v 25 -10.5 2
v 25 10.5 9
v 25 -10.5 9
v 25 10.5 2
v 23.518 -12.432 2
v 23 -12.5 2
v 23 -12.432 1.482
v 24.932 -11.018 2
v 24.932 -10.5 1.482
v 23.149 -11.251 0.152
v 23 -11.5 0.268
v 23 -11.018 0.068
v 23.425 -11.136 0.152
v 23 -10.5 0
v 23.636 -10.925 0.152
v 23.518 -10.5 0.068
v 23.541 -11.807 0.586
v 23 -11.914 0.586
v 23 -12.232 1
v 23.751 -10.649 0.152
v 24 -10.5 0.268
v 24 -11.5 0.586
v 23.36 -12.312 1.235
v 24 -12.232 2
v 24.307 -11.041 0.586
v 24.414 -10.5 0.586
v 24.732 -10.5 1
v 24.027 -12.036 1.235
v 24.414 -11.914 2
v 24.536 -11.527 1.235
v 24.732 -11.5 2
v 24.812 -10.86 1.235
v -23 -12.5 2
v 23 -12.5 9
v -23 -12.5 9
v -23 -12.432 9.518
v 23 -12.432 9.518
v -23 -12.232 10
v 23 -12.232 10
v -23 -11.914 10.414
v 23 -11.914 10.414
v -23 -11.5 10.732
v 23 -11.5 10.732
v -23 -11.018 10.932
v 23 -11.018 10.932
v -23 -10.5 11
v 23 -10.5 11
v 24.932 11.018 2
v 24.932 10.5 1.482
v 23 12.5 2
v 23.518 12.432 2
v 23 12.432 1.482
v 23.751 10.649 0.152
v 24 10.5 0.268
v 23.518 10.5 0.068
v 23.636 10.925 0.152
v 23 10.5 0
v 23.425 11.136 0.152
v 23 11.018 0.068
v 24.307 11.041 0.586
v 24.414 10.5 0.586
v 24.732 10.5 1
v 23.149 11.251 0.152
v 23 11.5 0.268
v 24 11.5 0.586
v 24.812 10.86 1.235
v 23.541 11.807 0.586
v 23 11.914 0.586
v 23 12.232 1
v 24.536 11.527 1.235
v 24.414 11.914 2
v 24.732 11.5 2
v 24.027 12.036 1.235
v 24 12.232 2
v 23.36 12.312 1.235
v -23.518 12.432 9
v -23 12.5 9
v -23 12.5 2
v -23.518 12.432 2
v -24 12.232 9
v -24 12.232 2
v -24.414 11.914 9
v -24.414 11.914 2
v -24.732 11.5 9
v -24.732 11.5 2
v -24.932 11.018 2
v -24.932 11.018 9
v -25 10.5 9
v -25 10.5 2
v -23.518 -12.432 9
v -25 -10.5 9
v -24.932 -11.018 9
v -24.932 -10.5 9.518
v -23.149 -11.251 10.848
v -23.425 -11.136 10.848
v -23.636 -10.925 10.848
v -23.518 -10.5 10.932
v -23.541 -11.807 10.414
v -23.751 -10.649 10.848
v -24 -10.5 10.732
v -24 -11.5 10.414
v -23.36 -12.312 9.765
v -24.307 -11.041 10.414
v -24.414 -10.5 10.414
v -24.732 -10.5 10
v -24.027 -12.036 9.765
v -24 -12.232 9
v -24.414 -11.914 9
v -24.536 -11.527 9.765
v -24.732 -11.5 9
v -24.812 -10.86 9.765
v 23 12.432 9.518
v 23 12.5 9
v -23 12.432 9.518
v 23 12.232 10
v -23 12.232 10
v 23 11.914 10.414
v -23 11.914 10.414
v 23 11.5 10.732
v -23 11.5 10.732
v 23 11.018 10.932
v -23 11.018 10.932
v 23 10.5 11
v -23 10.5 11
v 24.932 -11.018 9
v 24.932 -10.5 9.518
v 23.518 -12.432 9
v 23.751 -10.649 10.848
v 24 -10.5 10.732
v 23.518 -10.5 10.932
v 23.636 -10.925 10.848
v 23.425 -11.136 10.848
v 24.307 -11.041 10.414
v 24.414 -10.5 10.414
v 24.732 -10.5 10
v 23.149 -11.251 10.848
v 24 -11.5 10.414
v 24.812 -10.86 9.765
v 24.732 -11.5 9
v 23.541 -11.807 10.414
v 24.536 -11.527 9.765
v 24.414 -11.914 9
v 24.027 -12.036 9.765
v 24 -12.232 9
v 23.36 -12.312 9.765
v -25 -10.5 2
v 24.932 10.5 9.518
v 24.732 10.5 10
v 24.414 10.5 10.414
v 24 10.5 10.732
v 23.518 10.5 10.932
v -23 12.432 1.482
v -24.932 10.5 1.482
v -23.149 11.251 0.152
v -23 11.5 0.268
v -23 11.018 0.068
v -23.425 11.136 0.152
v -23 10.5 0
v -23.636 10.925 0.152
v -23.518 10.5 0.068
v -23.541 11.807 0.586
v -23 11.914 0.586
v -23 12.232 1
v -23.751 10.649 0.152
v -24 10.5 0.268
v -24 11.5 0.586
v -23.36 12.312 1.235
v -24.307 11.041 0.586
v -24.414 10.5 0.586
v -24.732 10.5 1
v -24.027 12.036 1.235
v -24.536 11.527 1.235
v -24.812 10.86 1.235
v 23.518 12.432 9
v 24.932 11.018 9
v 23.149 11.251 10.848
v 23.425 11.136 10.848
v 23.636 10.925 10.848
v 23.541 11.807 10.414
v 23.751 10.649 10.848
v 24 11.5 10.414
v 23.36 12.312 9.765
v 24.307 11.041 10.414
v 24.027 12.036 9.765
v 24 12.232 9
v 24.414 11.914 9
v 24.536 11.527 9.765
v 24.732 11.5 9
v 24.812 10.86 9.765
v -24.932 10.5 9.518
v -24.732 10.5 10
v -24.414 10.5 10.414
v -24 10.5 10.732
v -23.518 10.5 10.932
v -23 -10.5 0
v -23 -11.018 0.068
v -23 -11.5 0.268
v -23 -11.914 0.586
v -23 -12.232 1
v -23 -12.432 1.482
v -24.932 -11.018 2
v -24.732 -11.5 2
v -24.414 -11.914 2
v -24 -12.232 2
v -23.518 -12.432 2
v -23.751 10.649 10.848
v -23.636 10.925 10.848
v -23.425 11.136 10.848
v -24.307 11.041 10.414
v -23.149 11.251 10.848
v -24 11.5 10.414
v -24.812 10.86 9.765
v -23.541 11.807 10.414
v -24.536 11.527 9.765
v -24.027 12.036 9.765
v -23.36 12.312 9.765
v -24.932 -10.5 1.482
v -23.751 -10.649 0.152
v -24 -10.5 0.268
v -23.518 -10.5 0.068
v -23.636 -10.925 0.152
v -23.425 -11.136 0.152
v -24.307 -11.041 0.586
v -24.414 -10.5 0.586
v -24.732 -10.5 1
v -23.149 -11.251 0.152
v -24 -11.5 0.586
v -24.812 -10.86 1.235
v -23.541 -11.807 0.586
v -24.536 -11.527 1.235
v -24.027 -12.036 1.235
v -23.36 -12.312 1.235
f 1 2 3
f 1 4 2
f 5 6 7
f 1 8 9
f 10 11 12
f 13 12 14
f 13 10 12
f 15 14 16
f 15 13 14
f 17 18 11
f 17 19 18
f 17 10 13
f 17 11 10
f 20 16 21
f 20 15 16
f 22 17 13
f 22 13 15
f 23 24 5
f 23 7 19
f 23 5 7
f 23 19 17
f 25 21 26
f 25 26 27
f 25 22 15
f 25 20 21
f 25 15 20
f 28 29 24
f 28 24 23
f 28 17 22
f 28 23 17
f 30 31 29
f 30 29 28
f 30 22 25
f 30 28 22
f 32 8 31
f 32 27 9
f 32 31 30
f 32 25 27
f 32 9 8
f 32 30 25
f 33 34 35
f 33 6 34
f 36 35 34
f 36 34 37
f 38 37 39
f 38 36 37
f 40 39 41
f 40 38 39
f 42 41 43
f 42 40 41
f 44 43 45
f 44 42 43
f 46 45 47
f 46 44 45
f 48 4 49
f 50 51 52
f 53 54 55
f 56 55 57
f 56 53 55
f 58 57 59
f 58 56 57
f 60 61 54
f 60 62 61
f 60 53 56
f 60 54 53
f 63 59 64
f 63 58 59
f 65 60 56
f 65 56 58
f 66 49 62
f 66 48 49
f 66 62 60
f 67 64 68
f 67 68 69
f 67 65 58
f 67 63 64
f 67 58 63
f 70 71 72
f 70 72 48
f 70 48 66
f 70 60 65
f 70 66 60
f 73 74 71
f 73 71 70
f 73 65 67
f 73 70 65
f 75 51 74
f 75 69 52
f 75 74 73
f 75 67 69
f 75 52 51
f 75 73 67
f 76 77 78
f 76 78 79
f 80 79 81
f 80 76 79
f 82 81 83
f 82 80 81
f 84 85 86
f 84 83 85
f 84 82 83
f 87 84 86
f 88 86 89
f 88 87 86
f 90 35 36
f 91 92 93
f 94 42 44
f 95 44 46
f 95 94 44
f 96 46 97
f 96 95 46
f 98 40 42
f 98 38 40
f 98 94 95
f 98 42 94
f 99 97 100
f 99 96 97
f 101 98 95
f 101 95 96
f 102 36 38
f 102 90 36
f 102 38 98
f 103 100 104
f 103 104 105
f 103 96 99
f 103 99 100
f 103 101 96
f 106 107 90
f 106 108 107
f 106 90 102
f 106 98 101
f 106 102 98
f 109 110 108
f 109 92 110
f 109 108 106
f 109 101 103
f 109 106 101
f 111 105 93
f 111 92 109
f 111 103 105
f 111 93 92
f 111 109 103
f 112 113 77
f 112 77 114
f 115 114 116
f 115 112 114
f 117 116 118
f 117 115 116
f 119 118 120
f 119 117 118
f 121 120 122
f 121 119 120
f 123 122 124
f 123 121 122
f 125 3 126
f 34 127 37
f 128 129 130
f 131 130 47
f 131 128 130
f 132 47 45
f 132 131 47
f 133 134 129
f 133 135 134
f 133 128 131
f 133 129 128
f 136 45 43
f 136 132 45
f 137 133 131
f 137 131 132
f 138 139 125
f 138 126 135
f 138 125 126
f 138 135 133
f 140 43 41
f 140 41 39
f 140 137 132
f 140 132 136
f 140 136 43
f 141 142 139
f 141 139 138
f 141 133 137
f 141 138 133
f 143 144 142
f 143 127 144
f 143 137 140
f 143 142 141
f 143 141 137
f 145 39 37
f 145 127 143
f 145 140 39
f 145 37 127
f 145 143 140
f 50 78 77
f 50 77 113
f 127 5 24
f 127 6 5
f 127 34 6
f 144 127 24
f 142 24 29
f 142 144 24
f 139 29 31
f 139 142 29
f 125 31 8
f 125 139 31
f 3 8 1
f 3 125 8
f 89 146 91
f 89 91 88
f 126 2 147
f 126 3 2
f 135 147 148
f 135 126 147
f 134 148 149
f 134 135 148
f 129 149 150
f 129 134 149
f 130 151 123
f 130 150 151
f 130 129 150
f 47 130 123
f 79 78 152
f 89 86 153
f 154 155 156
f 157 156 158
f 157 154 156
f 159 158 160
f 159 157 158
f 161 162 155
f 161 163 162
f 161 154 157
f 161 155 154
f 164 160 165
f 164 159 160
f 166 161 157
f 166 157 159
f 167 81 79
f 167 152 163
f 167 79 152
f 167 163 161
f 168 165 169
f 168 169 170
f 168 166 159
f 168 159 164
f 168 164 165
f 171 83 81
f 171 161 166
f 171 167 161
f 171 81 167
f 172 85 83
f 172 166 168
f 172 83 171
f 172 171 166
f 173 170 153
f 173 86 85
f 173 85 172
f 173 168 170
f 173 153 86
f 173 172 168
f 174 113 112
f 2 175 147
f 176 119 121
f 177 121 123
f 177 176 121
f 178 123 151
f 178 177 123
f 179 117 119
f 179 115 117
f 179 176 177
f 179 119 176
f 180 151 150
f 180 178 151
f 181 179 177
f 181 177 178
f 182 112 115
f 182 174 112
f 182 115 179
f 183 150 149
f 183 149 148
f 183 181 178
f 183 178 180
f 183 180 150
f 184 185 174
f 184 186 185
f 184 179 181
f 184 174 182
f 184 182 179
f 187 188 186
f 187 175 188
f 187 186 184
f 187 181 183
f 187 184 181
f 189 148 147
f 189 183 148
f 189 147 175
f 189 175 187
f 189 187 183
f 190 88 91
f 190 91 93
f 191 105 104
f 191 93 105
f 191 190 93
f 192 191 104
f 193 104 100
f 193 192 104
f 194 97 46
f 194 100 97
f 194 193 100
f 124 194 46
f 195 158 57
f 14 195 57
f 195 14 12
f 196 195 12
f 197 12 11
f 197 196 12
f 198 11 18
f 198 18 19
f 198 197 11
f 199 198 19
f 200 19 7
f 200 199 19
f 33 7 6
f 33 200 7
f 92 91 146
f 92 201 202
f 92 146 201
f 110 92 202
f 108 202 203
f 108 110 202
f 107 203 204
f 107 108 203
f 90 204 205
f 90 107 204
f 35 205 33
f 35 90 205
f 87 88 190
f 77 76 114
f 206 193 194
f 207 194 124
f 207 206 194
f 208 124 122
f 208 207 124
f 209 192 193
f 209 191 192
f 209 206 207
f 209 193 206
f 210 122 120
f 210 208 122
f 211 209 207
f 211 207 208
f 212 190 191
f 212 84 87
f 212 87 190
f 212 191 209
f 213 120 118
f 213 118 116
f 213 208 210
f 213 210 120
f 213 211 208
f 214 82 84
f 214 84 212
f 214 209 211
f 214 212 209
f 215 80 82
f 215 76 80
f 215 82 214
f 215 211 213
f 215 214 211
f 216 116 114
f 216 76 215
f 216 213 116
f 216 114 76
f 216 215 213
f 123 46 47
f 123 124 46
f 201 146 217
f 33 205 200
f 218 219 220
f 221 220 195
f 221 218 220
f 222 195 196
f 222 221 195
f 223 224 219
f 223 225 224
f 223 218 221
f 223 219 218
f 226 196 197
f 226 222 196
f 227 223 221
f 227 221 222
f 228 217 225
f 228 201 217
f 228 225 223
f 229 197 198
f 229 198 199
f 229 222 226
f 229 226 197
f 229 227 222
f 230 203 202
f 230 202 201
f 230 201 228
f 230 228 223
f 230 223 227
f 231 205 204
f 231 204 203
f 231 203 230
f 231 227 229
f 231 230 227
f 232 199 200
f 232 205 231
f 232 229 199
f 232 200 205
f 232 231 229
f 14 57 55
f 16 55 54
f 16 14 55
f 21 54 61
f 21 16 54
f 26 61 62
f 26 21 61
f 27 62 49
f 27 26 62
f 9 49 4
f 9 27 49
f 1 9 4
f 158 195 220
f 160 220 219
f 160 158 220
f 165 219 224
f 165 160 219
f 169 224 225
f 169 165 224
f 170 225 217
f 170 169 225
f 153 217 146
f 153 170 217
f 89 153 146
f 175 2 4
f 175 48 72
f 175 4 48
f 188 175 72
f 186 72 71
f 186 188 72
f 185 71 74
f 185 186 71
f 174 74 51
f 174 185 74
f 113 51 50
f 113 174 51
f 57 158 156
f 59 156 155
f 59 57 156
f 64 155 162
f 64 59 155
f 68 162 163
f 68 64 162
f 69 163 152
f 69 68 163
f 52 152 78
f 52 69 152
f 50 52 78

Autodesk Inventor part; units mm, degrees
ref_plane "YZ Plane" through (0, 0, 0) normal (1, 0, 0) x (0, 1, 0)
ref_plane "XZ Plane" through (0, 0, 0) normal (0, 1, 0) x (-1, 0, 0)
ref_plane "XY Plane" through (0, 0, 0) normal (0, 0, 1) x (1, 0, 0)
sketch "Sketch1" plane through (0, 0, 0) normal (0, 0, 1) x (1, 0, 0)
  line L0 (-25, 12.5) -> (25, 12.5)
  line L1 (25, 12.5) -> (25, -12.5)
  line L2 (25, -12.5) -> (-25, -12.5)
  line L3 (-25, -12.5) -> (-25, 12.5)
  point P0 (0, 0)
  dimension "d0" = 50
  dimension "d1" = 25
  dimension "d2" = 25
  dimension "d3" = 12.5
extrude "Extrusion1" add sketch "Sketch1" along normal blind 11
fillet "Fillet1" radius 2 4 edges at (25, -12.5, 5.5) (25, 12.5, 5.5) (-25, 12.5, 5.5) (-25, -12.5, 5.5)
fillet "Fillet2" radius 2 16 edges at (-25, 0, 11) (-24.4142, 11.9142, 11) (0, 12.5, 11) (24.4142, 11.9142, 11) (25, 0, 11) (24.4142, -11.9142, 11) (0, -12.5, 11) (-24.4142, -11.9142, 11) (-24.4142, -11.9142, 0) (-25, 0, 0) (-24.4142, 11.9142, 0) (0, 12.5, 0) (24.4142, 11.9142, 0) (25, 0, 0) (24.4142, -11.9142, 0) (0, -12.5, 0)
properties part number "esc"
